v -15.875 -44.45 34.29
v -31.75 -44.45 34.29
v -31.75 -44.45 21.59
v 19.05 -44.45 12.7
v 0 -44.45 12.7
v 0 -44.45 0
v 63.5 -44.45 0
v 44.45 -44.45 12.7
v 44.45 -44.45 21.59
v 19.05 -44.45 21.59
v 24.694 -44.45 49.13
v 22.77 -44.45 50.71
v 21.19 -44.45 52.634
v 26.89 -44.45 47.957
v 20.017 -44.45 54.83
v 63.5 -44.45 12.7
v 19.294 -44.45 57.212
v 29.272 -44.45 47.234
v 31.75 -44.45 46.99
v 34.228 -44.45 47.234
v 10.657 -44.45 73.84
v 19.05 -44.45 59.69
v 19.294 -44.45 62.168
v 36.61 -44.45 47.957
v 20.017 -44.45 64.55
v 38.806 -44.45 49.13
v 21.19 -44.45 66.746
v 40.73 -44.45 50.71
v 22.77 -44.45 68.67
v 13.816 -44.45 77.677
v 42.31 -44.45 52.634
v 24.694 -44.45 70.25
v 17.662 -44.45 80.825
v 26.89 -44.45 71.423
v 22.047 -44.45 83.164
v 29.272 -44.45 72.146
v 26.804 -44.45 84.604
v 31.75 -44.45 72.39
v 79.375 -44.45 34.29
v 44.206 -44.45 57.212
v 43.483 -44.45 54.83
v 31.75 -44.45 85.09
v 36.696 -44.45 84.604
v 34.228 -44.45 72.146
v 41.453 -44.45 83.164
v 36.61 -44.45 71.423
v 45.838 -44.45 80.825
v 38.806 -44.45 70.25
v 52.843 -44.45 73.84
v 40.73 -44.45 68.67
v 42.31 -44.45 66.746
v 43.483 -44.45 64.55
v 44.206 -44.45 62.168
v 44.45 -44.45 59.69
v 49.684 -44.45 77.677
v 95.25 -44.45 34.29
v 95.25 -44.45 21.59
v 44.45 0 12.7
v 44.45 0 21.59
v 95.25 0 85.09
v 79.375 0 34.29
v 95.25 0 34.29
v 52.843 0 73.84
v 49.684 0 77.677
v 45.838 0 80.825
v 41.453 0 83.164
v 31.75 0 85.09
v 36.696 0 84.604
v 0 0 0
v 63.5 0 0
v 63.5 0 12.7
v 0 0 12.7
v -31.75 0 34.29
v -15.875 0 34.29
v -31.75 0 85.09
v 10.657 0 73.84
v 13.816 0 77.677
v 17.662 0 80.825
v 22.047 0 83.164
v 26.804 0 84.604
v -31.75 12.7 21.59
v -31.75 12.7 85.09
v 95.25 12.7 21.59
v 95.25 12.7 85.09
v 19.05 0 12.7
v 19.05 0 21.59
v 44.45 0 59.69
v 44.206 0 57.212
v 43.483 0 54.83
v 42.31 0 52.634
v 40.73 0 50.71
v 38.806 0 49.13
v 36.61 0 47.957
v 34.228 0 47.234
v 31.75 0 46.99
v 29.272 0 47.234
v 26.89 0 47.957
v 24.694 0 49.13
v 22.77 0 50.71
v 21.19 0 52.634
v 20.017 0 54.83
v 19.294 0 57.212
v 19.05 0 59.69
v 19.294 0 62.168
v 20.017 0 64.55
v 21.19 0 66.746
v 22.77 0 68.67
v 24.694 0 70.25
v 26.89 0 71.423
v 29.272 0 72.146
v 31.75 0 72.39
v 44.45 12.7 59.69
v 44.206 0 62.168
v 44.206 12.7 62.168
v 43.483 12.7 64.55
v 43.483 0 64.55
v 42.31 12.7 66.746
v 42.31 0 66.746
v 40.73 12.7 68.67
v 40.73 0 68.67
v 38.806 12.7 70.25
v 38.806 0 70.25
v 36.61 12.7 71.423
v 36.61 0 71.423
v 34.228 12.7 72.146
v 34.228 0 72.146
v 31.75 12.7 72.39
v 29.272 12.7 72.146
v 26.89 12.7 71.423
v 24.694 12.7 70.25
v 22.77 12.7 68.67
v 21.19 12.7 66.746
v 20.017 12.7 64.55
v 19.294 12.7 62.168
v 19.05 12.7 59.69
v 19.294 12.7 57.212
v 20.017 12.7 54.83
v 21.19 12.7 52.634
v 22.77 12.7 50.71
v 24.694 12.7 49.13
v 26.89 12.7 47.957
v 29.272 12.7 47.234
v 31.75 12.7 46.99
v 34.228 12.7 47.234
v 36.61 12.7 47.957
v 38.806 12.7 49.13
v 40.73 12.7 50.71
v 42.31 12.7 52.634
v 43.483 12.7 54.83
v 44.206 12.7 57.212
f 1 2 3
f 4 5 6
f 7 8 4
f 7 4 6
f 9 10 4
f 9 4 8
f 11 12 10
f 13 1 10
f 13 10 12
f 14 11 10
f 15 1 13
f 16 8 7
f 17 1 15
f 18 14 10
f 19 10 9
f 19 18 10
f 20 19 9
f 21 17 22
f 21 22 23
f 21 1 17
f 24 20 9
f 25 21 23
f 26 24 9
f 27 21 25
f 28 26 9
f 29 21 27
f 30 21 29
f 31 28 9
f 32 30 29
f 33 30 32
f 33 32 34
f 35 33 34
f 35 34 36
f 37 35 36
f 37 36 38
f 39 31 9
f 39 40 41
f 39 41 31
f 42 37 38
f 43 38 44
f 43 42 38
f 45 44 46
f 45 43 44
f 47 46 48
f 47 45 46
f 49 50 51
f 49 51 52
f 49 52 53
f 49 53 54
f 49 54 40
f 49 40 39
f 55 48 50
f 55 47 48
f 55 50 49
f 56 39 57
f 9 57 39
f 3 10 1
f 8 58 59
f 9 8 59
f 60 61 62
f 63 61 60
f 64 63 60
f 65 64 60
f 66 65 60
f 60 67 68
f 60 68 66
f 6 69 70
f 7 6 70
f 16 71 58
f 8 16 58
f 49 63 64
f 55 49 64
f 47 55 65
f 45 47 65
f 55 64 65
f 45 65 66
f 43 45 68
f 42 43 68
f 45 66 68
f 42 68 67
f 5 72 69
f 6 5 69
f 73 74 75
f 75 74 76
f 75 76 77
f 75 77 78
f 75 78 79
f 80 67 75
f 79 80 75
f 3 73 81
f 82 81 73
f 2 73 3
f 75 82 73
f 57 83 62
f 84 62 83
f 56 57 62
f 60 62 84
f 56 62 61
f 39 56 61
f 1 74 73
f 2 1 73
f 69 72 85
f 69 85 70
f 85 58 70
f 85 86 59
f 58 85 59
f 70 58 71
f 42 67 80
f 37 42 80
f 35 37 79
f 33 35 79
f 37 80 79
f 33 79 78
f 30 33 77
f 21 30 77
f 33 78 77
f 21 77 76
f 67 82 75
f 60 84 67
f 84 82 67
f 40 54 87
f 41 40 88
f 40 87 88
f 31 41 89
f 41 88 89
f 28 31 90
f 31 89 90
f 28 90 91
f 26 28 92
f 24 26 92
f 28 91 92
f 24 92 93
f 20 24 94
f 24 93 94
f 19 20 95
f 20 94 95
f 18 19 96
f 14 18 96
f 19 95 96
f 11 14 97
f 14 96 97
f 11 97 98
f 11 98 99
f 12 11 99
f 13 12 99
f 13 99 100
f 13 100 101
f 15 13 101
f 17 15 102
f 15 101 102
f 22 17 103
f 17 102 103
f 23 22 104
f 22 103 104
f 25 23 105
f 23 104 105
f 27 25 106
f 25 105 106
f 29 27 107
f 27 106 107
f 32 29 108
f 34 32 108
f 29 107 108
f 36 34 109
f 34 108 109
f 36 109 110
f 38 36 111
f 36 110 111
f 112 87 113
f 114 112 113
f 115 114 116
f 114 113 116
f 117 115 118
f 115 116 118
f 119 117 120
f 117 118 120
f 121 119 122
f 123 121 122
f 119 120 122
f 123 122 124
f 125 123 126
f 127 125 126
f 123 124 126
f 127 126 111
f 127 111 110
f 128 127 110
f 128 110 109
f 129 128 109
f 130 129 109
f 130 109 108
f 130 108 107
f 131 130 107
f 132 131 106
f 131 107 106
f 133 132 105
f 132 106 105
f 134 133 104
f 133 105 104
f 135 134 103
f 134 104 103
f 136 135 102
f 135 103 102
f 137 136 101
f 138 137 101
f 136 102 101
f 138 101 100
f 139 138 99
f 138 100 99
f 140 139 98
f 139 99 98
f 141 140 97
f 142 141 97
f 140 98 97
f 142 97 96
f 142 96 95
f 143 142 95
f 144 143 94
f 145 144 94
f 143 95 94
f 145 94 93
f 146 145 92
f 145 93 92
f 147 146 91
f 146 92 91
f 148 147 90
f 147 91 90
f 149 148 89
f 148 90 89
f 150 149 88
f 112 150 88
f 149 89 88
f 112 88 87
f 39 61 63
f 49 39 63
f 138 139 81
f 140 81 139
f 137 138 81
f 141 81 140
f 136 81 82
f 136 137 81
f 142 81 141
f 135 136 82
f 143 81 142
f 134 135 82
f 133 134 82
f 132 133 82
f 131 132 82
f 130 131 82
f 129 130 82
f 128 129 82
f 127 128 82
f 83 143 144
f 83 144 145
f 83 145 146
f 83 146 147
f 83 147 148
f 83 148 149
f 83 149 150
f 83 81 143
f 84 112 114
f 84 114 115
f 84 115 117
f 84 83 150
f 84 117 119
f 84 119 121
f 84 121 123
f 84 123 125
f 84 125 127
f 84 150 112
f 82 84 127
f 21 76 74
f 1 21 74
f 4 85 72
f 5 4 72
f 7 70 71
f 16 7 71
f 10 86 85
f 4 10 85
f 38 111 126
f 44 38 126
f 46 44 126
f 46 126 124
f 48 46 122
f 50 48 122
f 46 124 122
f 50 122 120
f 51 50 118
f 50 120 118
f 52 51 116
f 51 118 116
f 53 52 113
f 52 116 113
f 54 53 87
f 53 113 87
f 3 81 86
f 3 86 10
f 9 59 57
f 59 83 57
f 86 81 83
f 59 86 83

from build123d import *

# Parameters (mm, degrees)
F1_DEPTH = 44.45
F2_W     = 12.7
F2_H     = 63.5
F3_DEPTH = 158.75
F4_W     = 63.5
F4_H     = 63.5
F5_DEPTH = 50.8
F6_W     = 12.7
F6_H     = 63.5
F7_DEPTH = 31.75
F8_R     = 12.7
F9_DEPTH = 25.4


with BuildPart() as f1:
    # F0 (on Front) → F1 (new body)
    with BuildSketch(Plane.XZ):
        with BuildLine():
            ThreePointArc((44.45, 59.69), (40.730256, 68.670256), (31.75, 72.39))
            ThreePointArc((31.75, 72.39), (22.769744, 50.709744), (44.45, 59.69))
        make_face()
        with BuildLine():
            Line((0, 12.7), (0, 0))
            Line((0, 0), (63.5, 0))
            Line((63.5, 0), (63.5, 12.7))
            Line((63.5, 12.7), (44.45, 12.7))
            Line((44.45, 12.7), (44.45, 21.59))
            Line((44.45, 21.59), (95.25, 21.59))
            Line((95.25, 21.59), (95.25, 34.29))
            Line((95.25, 34.29), (79.375, 34.29))
            Line((79.375, 34.29), (52.843426, 73.840173))
            ThreePointArc((52.843426, 73.840173), (43.702941, 82.101765), (31.75, 85.09))
            ThreePointArc((31.75, 85.09), (19.797059, 82.101765), (10.656574, 73.840173))
            Line((10.656574, 73.840173), (-15.875, 34.29))
            Line((-15.875, 34.29), (-31.75, 34.29))
            Line((-31.75, 34.29), (-31.75, 21.59))
            Line((-31.75, 21.59), (19.05, 21.59))
            Line((19.05, 21.59), (19.05, 12.7))
            Line((19.05, 12.7), (0, 12.7))
        make_face()
        with BuildLine():
            ThreePointArc((44.45, 59.69), (22.769744, 50.709744), (31.75, 72.39))
            ThreePointArc((31.75, 72.39), (40.730256, 68.670256), (44.45, 59.69))
        make_face(mode=Mode.SUBTRACT)
    extrude(amount=F1_DEPTH)

    # F2 (on Right) → F3 (join)
    with BuildSketch(Plane.YZ):
        with Locations((6.35, 53.34)):
            Rectangle(F2_W, F2_H)
    extrude(amount=F3_DEPTH)

    # F4 (on face) → F5 (cut)
    with BuildSketch(Plane.XZ):
        with Locations((127, 53.34)):
            Rectangle(F4_W, F4_H)
    extrude(amount=-F5_DEPTH, mode=Mode.SUBTRACT)

    # F6 (on face) → F7 (join)
    with BuildSketch(Plane(origin=(0, 0, 0), x_dir=(0, -1, 0), z_dir=(-1, 0, 0))):
        with Locations((-6.35, 53.34)):
            Rectangle(F6_W, F6_H)
    extrude(amount=F7_DEPTH)

    # F8 (on face) → F9 (cut)
    with BuildSketch(Plane.XZ):
        with Locations((31.75, 59.69)):
            Circle(F8_R)
    extrude(amount=-F9_DEPTH, mode=Mode.SUBTRACT)


solid = f1.part
